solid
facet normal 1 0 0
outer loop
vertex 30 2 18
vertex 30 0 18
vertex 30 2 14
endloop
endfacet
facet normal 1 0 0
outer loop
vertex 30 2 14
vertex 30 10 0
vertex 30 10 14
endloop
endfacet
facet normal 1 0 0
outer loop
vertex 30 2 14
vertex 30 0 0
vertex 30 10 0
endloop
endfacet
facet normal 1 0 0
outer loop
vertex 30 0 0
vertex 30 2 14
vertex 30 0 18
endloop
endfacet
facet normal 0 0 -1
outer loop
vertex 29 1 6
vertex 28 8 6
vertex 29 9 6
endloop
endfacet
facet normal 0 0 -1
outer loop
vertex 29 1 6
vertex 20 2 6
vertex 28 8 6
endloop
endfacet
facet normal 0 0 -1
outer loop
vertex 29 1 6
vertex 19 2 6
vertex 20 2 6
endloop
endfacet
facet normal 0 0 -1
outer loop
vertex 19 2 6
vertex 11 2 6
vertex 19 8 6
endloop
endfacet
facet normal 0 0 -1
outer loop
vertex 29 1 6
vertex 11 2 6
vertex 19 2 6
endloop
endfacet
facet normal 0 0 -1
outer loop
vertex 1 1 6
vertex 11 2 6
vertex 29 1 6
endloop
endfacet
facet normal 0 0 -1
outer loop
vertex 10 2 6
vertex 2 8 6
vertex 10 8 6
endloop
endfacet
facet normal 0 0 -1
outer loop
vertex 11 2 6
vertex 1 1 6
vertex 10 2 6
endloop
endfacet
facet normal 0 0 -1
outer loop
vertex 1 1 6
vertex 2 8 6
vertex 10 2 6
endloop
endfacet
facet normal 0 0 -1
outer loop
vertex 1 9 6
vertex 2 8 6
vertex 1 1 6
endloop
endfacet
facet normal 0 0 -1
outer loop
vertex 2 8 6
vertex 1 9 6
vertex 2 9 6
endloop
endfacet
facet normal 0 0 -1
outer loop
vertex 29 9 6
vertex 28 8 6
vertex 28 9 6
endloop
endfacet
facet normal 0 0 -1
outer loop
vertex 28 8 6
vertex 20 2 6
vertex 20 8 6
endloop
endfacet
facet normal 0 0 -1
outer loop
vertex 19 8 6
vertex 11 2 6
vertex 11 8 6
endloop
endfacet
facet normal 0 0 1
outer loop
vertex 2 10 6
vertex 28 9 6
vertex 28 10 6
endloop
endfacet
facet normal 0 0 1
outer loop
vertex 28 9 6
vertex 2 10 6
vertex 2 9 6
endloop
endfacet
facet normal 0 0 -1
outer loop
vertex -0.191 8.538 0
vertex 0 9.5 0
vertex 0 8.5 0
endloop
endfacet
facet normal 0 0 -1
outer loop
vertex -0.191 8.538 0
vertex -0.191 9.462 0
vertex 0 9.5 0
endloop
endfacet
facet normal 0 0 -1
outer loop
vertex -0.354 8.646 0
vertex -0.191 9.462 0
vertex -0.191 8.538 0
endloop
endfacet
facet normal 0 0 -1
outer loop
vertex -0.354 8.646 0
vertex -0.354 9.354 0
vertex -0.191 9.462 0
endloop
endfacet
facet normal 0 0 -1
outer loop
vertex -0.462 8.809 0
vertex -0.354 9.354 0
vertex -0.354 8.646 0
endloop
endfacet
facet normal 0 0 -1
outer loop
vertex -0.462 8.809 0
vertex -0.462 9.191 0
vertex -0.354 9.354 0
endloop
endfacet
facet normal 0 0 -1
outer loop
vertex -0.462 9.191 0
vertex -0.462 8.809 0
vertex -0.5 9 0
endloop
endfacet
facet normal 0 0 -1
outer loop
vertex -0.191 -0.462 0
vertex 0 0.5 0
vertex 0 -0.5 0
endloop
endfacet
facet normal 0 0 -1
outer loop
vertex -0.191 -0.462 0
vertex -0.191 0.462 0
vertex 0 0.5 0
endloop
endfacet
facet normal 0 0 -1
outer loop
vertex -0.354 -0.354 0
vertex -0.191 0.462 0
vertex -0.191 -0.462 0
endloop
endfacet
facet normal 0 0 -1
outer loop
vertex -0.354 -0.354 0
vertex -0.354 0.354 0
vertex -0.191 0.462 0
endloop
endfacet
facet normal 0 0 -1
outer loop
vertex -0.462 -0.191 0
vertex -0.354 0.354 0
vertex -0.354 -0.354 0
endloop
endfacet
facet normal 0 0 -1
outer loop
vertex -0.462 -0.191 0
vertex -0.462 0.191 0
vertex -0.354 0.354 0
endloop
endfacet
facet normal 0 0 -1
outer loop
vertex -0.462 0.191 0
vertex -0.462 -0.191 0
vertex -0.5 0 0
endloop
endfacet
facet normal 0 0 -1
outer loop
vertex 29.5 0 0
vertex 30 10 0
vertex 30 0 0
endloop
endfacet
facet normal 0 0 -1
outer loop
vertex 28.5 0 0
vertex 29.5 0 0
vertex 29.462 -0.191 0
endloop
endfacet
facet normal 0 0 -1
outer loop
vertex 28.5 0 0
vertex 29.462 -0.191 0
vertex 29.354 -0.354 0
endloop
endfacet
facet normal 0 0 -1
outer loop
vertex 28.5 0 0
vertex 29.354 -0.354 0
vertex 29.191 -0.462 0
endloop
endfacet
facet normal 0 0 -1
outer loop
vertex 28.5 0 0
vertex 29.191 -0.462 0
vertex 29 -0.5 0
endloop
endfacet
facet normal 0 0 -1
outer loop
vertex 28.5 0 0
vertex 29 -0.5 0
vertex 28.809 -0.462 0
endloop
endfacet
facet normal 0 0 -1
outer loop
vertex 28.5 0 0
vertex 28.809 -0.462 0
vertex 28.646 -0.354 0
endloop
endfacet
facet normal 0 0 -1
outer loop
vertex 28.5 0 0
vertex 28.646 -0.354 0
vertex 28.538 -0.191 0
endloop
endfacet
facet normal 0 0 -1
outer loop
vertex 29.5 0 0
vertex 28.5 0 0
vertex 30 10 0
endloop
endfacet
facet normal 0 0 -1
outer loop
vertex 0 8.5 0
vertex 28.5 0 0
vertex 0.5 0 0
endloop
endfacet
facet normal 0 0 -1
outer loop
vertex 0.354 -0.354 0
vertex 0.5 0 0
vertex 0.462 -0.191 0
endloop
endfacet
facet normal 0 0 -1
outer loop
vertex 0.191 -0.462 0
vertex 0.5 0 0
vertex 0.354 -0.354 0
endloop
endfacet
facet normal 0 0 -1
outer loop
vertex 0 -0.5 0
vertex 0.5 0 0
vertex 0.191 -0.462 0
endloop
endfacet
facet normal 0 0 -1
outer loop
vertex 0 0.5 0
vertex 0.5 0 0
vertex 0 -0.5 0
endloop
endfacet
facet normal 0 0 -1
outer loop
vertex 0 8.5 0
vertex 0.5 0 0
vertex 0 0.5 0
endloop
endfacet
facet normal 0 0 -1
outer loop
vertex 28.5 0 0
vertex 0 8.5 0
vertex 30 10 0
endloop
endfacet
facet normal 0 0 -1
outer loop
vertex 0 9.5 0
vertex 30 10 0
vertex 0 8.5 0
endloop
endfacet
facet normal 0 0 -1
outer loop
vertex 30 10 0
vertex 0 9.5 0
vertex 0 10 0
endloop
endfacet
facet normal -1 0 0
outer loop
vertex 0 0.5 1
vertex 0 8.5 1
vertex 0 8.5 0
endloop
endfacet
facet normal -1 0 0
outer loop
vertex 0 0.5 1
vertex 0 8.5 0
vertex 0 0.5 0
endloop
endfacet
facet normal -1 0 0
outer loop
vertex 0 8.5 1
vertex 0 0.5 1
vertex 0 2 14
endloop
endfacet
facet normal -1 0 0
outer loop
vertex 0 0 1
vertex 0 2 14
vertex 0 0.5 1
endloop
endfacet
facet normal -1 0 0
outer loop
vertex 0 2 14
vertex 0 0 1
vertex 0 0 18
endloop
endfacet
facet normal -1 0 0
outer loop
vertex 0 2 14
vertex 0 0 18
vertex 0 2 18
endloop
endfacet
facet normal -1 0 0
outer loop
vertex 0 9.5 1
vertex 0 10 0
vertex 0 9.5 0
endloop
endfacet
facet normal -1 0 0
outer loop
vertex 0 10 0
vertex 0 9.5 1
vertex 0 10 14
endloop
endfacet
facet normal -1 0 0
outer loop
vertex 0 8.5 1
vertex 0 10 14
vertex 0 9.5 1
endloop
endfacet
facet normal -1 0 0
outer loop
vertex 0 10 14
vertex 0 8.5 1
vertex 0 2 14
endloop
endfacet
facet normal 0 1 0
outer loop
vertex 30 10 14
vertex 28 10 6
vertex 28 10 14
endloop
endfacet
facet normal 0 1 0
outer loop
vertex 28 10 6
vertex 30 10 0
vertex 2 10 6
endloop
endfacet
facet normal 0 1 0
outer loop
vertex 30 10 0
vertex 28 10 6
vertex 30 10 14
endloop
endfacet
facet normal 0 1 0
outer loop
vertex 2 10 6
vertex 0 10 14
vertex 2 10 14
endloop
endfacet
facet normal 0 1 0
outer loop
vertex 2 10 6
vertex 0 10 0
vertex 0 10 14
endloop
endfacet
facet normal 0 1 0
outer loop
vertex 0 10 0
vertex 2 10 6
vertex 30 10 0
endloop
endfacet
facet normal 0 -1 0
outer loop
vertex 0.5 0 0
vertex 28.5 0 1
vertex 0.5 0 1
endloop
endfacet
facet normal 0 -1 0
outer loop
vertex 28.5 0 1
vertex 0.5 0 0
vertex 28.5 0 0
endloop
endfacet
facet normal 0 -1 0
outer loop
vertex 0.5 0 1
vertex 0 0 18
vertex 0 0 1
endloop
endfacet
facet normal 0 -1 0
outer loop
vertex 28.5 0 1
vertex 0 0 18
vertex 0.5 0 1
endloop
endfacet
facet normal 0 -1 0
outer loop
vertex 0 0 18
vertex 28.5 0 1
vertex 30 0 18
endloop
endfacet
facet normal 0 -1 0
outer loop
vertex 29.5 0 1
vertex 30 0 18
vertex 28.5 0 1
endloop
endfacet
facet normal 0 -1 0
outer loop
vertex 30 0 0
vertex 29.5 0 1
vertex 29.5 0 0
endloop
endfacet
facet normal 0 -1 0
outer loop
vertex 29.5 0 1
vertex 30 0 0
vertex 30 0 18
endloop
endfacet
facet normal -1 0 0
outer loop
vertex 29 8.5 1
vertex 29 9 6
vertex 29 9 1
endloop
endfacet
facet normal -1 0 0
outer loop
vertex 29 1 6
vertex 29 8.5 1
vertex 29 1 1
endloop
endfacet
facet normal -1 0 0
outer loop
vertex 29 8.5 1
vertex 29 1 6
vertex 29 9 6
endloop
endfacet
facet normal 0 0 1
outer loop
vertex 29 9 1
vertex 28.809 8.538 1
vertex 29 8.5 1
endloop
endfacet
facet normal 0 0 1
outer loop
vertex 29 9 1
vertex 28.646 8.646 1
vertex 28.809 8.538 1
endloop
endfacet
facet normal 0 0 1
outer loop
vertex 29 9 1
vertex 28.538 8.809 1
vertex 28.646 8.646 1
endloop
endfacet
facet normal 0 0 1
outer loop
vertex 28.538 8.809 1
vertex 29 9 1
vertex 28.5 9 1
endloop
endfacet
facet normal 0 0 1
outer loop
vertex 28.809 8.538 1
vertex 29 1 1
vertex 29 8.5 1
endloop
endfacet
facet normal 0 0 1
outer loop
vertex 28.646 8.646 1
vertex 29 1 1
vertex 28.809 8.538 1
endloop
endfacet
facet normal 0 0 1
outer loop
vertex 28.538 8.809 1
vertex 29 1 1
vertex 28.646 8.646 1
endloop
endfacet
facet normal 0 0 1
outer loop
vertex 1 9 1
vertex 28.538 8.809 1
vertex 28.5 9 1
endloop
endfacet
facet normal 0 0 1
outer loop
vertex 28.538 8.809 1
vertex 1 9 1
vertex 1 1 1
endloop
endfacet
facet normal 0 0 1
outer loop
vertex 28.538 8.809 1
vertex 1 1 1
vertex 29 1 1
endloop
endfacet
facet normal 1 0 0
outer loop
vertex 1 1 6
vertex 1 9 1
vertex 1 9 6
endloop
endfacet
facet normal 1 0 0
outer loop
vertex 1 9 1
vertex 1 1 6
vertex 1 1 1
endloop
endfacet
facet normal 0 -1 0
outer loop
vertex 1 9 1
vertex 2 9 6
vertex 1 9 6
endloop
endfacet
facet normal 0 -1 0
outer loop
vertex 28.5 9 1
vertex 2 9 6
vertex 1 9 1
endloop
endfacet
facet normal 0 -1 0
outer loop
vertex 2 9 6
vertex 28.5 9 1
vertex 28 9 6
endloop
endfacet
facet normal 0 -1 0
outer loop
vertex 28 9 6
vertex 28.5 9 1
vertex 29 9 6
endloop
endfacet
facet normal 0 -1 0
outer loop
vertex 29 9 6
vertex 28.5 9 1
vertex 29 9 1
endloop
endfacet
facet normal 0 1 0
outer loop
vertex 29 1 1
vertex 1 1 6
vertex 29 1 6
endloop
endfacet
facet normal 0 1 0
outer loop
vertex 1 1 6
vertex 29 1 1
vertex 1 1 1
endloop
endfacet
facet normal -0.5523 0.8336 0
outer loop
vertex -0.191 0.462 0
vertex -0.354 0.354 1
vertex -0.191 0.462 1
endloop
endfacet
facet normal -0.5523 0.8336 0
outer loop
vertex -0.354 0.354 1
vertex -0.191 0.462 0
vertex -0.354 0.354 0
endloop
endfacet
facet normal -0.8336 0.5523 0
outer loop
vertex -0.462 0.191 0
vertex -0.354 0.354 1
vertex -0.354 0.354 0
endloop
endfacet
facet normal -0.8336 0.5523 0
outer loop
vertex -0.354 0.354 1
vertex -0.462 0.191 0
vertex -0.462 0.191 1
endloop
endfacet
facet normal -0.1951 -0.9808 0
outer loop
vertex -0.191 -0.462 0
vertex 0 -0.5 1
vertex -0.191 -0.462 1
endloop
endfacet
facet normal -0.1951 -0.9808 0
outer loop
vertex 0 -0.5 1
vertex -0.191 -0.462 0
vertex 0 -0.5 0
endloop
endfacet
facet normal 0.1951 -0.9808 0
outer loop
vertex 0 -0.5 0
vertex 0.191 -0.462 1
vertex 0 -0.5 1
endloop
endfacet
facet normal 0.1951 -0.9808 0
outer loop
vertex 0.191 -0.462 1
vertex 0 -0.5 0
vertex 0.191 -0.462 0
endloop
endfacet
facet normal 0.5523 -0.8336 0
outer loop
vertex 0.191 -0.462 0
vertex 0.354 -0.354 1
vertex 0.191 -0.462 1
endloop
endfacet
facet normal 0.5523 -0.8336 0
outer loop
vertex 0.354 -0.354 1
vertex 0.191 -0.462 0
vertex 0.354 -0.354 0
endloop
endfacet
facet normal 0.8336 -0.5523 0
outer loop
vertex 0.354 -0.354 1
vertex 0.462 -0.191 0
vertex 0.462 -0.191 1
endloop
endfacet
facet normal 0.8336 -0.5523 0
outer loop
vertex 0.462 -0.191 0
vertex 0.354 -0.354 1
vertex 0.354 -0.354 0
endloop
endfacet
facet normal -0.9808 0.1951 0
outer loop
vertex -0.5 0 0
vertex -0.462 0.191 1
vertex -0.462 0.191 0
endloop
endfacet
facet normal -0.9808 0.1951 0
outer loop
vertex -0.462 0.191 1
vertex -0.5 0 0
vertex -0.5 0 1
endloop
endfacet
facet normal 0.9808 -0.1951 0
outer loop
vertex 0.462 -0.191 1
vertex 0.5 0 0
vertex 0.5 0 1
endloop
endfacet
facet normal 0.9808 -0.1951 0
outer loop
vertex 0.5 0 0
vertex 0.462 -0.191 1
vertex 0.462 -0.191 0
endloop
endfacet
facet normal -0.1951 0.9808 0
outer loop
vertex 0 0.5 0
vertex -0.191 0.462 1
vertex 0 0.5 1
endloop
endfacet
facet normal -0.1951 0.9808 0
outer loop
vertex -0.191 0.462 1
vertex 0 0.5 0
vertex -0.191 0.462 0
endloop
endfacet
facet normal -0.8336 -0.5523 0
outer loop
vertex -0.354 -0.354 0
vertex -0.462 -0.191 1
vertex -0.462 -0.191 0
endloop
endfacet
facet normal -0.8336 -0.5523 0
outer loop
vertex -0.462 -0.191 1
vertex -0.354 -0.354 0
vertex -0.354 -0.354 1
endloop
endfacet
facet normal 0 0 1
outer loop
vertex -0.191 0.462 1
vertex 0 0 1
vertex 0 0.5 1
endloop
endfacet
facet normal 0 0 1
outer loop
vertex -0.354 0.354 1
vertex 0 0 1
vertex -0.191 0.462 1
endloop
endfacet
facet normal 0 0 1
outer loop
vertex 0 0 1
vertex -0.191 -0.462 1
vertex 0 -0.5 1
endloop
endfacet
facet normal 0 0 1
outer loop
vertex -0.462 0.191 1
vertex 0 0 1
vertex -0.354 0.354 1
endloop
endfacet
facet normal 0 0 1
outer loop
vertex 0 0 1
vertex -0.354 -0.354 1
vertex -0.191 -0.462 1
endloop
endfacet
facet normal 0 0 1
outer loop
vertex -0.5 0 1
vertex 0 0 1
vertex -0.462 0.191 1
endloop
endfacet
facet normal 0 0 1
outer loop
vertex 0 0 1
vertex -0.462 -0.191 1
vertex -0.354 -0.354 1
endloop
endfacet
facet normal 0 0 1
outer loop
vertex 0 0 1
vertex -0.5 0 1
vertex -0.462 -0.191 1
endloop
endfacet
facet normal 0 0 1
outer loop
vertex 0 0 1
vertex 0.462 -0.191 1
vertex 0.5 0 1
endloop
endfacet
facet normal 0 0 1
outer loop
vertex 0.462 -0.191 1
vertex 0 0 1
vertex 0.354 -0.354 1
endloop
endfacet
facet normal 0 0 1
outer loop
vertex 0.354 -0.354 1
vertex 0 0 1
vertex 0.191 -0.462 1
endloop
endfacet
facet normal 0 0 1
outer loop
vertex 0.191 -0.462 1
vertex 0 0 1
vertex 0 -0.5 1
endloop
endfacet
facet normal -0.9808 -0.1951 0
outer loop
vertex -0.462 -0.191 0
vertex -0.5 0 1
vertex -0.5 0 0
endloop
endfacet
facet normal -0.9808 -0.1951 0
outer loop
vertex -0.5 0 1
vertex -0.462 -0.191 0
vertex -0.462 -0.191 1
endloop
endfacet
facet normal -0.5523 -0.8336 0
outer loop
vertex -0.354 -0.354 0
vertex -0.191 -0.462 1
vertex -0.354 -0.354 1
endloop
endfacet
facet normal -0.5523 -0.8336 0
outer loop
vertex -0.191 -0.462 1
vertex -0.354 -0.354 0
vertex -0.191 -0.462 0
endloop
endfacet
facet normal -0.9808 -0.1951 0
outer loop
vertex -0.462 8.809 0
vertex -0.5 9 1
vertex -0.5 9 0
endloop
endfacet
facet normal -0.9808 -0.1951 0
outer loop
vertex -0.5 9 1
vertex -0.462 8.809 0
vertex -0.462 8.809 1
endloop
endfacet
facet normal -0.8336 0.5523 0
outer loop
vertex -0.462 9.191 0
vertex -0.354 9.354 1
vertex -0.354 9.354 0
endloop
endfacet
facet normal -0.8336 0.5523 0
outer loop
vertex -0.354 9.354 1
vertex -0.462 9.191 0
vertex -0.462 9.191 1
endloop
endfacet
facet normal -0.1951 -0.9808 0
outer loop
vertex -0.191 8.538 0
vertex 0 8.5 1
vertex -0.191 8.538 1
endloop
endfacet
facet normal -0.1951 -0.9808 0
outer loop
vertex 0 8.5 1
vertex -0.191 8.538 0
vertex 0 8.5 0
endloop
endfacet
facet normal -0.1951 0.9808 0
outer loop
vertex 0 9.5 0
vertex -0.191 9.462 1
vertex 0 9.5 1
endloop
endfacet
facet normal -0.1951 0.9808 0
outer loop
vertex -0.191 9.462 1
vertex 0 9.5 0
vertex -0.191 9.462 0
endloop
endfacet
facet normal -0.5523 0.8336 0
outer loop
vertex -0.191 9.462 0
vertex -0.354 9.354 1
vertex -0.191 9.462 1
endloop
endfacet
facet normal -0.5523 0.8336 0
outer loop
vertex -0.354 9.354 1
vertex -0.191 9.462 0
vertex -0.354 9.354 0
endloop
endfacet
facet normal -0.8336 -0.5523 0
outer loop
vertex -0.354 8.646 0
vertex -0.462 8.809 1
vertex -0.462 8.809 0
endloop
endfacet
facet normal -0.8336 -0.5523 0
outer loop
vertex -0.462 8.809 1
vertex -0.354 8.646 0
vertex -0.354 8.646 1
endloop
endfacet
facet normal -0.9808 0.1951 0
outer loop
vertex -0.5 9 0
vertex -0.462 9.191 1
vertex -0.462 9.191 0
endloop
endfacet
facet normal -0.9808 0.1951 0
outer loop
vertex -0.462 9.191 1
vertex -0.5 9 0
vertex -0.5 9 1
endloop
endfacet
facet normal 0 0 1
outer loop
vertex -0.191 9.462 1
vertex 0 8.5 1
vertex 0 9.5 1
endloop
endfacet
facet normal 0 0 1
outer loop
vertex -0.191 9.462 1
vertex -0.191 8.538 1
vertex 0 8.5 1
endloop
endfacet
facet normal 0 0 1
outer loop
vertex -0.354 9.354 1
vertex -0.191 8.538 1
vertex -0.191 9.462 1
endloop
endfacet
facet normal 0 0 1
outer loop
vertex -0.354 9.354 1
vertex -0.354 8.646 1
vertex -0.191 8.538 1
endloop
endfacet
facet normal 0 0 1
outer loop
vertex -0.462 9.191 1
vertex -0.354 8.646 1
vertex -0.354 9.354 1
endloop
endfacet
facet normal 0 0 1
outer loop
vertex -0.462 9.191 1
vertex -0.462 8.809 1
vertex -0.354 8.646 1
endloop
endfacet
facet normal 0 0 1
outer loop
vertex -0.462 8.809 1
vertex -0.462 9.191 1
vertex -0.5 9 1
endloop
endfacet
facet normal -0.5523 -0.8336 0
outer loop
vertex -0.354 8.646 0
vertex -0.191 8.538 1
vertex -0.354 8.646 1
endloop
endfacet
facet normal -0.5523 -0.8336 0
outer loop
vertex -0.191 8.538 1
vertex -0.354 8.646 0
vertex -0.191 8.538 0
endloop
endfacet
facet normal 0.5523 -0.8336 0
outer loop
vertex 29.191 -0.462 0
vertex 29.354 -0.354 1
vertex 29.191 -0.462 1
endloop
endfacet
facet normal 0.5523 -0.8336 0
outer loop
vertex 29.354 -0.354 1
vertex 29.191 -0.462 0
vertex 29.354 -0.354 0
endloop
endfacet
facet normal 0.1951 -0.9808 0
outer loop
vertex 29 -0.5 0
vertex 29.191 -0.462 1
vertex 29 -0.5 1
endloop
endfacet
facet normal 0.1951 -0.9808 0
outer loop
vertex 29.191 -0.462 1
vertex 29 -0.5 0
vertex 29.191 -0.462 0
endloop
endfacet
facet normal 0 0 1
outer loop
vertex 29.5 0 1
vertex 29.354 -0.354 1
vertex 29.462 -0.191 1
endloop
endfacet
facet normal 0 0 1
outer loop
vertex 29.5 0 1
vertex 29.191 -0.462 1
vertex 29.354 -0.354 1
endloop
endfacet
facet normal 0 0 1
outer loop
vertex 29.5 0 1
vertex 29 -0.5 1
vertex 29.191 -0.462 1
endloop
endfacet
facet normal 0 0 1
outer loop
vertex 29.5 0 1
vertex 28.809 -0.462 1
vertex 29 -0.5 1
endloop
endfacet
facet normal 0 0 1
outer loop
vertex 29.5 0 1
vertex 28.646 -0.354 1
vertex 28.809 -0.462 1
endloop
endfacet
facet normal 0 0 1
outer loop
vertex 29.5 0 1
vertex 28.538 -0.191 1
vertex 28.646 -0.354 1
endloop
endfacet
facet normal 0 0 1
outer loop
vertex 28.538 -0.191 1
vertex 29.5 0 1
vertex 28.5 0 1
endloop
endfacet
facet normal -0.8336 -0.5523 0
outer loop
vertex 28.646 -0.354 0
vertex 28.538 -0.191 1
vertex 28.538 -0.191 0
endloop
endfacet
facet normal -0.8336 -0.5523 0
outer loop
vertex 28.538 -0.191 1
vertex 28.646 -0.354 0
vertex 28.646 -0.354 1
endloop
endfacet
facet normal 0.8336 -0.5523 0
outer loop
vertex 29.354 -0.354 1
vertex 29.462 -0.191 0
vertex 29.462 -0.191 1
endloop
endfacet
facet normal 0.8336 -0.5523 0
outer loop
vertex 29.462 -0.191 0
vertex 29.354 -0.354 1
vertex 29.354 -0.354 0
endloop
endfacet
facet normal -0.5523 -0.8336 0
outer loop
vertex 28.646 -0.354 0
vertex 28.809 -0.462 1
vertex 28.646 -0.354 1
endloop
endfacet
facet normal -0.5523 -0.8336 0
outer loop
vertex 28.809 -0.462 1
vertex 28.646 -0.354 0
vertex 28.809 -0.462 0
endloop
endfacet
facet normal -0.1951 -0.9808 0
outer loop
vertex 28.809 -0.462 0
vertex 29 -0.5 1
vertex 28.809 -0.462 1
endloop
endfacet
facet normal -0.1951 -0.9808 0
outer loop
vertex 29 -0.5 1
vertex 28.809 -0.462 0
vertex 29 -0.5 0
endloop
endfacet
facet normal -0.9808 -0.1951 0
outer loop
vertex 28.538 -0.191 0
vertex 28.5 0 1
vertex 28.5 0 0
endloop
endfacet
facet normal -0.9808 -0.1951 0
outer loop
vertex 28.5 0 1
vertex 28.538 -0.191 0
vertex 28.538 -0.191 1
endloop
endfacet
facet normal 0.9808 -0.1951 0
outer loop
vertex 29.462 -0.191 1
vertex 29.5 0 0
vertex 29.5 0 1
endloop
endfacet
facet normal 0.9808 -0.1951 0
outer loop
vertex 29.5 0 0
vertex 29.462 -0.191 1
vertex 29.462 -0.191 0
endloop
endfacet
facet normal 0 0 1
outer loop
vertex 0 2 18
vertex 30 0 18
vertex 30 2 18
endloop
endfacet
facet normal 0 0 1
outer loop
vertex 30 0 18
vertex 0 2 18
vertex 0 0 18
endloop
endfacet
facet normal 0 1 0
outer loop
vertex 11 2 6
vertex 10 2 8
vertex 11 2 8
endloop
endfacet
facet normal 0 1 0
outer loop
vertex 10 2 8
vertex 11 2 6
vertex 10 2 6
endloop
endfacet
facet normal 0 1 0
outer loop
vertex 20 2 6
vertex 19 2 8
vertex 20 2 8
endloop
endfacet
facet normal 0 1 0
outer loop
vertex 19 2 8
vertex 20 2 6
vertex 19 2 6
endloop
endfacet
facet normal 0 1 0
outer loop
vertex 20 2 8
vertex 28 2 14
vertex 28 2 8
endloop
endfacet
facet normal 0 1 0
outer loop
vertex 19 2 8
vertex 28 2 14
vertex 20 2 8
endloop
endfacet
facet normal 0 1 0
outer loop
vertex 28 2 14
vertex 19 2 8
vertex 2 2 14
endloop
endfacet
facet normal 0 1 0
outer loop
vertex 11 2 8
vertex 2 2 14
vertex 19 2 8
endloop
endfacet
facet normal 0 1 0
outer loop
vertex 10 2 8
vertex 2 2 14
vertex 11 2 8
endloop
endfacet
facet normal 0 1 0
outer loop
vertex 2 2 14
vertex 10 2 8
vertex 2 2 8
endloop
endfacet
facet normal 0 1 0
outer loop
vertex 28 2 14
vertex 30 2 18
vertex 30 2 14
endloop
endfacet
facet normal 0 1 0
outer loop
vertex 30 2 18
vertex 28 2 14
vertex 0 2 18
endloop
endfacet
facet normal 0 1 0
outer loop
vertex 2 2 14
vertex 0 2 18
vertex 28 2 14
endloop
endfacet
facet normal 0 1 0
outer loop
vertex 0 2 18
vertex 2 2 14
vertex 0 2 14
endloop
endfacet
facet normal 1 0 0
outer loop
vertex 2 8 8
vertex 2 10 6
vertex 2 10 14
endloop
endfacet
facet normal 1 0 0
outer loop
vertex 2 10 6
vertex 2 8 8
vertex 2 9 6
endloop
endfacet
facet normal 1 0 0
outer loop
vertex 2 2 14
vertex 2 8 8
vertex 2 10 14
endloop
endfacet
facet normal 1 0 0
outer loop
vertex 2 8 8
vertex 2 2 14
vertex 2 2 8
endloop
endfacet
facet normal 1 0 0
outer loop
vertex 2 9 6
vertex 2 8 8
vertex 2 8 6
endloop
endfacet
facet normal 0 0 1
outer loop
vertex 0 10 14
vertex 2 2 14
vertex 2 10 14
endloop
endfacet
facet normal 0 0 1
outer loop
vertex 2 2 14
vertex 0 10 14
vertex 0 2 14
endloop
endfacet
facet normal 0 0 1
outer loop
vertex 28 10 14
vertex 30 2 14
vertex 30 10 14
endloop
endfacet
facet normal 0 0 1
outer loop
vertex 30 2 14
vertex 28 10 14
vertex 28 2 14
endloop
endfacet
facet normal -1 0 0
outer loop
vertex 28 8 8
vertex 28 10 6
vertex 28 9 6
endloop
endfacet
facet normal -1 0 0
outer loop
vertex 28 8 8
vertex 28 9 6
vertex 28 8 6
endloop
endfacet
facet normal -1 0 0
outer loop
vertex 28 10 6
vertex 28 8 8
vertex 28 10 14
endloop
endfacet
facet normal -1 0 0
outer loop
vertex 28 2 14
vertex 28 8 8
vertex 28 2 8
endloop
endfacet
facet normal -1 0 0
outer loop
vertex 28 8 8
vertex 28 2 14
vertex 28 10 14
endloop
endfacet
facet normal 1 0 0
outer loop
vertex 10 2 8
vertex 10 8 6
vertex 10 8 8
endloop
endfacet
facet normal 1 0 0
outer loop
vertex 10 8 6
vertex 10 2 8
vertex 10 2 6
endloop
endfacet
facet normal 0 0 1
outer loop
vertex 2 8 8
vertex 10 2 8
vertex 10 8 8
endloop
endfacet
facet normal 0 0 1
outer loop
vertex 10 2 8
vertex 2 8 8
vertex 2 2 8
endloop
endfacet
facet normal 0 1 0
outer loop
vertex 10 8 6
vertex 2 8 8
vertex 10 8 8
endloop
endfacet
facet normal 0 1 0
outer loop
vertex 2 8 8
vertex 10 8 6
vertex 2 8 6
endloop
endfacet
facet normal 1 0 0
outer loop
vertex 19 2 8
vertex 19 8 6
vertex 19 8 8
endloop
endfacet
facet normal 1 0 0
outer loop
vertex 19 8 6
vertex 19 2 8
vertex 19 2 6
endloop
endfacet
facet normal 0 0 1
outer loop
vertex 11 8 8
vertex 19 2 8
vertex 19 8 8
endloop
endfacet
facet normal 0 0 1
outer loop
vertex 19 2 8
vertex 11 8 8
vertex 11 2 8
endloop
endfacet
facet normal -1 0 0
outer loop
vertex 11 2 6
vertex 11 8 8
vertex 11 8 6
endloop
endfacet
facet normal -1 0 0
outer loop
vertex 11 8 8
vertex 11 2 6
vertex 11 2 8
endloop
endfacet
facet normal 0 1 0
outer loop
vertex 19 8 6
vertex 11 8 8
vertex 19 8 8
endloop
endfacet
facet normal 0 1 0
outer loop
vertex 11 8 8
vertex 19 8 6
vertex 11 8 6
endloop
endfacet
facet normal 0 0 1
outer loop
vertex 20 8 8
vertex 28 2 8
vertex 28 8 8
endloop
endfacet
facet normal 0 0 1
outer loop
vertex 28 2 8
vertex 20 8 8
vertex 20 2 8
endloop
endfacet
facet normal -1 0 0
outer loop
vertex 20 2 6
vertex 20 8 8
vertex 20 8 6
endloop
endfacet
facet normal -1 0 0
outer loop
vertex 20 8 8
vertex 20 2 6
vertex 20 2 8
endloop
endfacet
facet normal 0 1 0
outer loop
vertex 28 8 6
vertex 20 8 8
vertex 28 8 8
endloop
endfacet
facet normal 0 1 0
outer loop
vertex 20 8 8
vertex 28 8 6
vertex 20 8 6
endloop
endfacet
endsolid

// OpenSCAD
// Main body of the couch
difference() {
    cube([30, 10, 6]);
    translate([1, 1, 1]) cube([28, 8, 5.5]);
}

// Couch legs - assuming 4 legs at each corner
for(i = [0, 29]) {
    for(j = [0, 9]) {
        translate([i, j, 0]) cylinder(h = 1, r1 = 0.5, r2 = 0.5, $fn = 16);
    }
}

// Couch backrest
translate([0, 0, 6]) cube([30, 2, 12]);

// Couch armrests
translate([0, 0, 6]) cube([2, 10, 8]);
translate([28, 0, 6]) cube([2, 10, 8]);

// Couch cushions - divided into three sections on the seat
translate([2, 2, 6]) cube([8, 6, 2]);
translate([11, 2, 6]) cube([8, 6, 2]);
translate([20, 2, 6]) cube([8, 6, 2]);
